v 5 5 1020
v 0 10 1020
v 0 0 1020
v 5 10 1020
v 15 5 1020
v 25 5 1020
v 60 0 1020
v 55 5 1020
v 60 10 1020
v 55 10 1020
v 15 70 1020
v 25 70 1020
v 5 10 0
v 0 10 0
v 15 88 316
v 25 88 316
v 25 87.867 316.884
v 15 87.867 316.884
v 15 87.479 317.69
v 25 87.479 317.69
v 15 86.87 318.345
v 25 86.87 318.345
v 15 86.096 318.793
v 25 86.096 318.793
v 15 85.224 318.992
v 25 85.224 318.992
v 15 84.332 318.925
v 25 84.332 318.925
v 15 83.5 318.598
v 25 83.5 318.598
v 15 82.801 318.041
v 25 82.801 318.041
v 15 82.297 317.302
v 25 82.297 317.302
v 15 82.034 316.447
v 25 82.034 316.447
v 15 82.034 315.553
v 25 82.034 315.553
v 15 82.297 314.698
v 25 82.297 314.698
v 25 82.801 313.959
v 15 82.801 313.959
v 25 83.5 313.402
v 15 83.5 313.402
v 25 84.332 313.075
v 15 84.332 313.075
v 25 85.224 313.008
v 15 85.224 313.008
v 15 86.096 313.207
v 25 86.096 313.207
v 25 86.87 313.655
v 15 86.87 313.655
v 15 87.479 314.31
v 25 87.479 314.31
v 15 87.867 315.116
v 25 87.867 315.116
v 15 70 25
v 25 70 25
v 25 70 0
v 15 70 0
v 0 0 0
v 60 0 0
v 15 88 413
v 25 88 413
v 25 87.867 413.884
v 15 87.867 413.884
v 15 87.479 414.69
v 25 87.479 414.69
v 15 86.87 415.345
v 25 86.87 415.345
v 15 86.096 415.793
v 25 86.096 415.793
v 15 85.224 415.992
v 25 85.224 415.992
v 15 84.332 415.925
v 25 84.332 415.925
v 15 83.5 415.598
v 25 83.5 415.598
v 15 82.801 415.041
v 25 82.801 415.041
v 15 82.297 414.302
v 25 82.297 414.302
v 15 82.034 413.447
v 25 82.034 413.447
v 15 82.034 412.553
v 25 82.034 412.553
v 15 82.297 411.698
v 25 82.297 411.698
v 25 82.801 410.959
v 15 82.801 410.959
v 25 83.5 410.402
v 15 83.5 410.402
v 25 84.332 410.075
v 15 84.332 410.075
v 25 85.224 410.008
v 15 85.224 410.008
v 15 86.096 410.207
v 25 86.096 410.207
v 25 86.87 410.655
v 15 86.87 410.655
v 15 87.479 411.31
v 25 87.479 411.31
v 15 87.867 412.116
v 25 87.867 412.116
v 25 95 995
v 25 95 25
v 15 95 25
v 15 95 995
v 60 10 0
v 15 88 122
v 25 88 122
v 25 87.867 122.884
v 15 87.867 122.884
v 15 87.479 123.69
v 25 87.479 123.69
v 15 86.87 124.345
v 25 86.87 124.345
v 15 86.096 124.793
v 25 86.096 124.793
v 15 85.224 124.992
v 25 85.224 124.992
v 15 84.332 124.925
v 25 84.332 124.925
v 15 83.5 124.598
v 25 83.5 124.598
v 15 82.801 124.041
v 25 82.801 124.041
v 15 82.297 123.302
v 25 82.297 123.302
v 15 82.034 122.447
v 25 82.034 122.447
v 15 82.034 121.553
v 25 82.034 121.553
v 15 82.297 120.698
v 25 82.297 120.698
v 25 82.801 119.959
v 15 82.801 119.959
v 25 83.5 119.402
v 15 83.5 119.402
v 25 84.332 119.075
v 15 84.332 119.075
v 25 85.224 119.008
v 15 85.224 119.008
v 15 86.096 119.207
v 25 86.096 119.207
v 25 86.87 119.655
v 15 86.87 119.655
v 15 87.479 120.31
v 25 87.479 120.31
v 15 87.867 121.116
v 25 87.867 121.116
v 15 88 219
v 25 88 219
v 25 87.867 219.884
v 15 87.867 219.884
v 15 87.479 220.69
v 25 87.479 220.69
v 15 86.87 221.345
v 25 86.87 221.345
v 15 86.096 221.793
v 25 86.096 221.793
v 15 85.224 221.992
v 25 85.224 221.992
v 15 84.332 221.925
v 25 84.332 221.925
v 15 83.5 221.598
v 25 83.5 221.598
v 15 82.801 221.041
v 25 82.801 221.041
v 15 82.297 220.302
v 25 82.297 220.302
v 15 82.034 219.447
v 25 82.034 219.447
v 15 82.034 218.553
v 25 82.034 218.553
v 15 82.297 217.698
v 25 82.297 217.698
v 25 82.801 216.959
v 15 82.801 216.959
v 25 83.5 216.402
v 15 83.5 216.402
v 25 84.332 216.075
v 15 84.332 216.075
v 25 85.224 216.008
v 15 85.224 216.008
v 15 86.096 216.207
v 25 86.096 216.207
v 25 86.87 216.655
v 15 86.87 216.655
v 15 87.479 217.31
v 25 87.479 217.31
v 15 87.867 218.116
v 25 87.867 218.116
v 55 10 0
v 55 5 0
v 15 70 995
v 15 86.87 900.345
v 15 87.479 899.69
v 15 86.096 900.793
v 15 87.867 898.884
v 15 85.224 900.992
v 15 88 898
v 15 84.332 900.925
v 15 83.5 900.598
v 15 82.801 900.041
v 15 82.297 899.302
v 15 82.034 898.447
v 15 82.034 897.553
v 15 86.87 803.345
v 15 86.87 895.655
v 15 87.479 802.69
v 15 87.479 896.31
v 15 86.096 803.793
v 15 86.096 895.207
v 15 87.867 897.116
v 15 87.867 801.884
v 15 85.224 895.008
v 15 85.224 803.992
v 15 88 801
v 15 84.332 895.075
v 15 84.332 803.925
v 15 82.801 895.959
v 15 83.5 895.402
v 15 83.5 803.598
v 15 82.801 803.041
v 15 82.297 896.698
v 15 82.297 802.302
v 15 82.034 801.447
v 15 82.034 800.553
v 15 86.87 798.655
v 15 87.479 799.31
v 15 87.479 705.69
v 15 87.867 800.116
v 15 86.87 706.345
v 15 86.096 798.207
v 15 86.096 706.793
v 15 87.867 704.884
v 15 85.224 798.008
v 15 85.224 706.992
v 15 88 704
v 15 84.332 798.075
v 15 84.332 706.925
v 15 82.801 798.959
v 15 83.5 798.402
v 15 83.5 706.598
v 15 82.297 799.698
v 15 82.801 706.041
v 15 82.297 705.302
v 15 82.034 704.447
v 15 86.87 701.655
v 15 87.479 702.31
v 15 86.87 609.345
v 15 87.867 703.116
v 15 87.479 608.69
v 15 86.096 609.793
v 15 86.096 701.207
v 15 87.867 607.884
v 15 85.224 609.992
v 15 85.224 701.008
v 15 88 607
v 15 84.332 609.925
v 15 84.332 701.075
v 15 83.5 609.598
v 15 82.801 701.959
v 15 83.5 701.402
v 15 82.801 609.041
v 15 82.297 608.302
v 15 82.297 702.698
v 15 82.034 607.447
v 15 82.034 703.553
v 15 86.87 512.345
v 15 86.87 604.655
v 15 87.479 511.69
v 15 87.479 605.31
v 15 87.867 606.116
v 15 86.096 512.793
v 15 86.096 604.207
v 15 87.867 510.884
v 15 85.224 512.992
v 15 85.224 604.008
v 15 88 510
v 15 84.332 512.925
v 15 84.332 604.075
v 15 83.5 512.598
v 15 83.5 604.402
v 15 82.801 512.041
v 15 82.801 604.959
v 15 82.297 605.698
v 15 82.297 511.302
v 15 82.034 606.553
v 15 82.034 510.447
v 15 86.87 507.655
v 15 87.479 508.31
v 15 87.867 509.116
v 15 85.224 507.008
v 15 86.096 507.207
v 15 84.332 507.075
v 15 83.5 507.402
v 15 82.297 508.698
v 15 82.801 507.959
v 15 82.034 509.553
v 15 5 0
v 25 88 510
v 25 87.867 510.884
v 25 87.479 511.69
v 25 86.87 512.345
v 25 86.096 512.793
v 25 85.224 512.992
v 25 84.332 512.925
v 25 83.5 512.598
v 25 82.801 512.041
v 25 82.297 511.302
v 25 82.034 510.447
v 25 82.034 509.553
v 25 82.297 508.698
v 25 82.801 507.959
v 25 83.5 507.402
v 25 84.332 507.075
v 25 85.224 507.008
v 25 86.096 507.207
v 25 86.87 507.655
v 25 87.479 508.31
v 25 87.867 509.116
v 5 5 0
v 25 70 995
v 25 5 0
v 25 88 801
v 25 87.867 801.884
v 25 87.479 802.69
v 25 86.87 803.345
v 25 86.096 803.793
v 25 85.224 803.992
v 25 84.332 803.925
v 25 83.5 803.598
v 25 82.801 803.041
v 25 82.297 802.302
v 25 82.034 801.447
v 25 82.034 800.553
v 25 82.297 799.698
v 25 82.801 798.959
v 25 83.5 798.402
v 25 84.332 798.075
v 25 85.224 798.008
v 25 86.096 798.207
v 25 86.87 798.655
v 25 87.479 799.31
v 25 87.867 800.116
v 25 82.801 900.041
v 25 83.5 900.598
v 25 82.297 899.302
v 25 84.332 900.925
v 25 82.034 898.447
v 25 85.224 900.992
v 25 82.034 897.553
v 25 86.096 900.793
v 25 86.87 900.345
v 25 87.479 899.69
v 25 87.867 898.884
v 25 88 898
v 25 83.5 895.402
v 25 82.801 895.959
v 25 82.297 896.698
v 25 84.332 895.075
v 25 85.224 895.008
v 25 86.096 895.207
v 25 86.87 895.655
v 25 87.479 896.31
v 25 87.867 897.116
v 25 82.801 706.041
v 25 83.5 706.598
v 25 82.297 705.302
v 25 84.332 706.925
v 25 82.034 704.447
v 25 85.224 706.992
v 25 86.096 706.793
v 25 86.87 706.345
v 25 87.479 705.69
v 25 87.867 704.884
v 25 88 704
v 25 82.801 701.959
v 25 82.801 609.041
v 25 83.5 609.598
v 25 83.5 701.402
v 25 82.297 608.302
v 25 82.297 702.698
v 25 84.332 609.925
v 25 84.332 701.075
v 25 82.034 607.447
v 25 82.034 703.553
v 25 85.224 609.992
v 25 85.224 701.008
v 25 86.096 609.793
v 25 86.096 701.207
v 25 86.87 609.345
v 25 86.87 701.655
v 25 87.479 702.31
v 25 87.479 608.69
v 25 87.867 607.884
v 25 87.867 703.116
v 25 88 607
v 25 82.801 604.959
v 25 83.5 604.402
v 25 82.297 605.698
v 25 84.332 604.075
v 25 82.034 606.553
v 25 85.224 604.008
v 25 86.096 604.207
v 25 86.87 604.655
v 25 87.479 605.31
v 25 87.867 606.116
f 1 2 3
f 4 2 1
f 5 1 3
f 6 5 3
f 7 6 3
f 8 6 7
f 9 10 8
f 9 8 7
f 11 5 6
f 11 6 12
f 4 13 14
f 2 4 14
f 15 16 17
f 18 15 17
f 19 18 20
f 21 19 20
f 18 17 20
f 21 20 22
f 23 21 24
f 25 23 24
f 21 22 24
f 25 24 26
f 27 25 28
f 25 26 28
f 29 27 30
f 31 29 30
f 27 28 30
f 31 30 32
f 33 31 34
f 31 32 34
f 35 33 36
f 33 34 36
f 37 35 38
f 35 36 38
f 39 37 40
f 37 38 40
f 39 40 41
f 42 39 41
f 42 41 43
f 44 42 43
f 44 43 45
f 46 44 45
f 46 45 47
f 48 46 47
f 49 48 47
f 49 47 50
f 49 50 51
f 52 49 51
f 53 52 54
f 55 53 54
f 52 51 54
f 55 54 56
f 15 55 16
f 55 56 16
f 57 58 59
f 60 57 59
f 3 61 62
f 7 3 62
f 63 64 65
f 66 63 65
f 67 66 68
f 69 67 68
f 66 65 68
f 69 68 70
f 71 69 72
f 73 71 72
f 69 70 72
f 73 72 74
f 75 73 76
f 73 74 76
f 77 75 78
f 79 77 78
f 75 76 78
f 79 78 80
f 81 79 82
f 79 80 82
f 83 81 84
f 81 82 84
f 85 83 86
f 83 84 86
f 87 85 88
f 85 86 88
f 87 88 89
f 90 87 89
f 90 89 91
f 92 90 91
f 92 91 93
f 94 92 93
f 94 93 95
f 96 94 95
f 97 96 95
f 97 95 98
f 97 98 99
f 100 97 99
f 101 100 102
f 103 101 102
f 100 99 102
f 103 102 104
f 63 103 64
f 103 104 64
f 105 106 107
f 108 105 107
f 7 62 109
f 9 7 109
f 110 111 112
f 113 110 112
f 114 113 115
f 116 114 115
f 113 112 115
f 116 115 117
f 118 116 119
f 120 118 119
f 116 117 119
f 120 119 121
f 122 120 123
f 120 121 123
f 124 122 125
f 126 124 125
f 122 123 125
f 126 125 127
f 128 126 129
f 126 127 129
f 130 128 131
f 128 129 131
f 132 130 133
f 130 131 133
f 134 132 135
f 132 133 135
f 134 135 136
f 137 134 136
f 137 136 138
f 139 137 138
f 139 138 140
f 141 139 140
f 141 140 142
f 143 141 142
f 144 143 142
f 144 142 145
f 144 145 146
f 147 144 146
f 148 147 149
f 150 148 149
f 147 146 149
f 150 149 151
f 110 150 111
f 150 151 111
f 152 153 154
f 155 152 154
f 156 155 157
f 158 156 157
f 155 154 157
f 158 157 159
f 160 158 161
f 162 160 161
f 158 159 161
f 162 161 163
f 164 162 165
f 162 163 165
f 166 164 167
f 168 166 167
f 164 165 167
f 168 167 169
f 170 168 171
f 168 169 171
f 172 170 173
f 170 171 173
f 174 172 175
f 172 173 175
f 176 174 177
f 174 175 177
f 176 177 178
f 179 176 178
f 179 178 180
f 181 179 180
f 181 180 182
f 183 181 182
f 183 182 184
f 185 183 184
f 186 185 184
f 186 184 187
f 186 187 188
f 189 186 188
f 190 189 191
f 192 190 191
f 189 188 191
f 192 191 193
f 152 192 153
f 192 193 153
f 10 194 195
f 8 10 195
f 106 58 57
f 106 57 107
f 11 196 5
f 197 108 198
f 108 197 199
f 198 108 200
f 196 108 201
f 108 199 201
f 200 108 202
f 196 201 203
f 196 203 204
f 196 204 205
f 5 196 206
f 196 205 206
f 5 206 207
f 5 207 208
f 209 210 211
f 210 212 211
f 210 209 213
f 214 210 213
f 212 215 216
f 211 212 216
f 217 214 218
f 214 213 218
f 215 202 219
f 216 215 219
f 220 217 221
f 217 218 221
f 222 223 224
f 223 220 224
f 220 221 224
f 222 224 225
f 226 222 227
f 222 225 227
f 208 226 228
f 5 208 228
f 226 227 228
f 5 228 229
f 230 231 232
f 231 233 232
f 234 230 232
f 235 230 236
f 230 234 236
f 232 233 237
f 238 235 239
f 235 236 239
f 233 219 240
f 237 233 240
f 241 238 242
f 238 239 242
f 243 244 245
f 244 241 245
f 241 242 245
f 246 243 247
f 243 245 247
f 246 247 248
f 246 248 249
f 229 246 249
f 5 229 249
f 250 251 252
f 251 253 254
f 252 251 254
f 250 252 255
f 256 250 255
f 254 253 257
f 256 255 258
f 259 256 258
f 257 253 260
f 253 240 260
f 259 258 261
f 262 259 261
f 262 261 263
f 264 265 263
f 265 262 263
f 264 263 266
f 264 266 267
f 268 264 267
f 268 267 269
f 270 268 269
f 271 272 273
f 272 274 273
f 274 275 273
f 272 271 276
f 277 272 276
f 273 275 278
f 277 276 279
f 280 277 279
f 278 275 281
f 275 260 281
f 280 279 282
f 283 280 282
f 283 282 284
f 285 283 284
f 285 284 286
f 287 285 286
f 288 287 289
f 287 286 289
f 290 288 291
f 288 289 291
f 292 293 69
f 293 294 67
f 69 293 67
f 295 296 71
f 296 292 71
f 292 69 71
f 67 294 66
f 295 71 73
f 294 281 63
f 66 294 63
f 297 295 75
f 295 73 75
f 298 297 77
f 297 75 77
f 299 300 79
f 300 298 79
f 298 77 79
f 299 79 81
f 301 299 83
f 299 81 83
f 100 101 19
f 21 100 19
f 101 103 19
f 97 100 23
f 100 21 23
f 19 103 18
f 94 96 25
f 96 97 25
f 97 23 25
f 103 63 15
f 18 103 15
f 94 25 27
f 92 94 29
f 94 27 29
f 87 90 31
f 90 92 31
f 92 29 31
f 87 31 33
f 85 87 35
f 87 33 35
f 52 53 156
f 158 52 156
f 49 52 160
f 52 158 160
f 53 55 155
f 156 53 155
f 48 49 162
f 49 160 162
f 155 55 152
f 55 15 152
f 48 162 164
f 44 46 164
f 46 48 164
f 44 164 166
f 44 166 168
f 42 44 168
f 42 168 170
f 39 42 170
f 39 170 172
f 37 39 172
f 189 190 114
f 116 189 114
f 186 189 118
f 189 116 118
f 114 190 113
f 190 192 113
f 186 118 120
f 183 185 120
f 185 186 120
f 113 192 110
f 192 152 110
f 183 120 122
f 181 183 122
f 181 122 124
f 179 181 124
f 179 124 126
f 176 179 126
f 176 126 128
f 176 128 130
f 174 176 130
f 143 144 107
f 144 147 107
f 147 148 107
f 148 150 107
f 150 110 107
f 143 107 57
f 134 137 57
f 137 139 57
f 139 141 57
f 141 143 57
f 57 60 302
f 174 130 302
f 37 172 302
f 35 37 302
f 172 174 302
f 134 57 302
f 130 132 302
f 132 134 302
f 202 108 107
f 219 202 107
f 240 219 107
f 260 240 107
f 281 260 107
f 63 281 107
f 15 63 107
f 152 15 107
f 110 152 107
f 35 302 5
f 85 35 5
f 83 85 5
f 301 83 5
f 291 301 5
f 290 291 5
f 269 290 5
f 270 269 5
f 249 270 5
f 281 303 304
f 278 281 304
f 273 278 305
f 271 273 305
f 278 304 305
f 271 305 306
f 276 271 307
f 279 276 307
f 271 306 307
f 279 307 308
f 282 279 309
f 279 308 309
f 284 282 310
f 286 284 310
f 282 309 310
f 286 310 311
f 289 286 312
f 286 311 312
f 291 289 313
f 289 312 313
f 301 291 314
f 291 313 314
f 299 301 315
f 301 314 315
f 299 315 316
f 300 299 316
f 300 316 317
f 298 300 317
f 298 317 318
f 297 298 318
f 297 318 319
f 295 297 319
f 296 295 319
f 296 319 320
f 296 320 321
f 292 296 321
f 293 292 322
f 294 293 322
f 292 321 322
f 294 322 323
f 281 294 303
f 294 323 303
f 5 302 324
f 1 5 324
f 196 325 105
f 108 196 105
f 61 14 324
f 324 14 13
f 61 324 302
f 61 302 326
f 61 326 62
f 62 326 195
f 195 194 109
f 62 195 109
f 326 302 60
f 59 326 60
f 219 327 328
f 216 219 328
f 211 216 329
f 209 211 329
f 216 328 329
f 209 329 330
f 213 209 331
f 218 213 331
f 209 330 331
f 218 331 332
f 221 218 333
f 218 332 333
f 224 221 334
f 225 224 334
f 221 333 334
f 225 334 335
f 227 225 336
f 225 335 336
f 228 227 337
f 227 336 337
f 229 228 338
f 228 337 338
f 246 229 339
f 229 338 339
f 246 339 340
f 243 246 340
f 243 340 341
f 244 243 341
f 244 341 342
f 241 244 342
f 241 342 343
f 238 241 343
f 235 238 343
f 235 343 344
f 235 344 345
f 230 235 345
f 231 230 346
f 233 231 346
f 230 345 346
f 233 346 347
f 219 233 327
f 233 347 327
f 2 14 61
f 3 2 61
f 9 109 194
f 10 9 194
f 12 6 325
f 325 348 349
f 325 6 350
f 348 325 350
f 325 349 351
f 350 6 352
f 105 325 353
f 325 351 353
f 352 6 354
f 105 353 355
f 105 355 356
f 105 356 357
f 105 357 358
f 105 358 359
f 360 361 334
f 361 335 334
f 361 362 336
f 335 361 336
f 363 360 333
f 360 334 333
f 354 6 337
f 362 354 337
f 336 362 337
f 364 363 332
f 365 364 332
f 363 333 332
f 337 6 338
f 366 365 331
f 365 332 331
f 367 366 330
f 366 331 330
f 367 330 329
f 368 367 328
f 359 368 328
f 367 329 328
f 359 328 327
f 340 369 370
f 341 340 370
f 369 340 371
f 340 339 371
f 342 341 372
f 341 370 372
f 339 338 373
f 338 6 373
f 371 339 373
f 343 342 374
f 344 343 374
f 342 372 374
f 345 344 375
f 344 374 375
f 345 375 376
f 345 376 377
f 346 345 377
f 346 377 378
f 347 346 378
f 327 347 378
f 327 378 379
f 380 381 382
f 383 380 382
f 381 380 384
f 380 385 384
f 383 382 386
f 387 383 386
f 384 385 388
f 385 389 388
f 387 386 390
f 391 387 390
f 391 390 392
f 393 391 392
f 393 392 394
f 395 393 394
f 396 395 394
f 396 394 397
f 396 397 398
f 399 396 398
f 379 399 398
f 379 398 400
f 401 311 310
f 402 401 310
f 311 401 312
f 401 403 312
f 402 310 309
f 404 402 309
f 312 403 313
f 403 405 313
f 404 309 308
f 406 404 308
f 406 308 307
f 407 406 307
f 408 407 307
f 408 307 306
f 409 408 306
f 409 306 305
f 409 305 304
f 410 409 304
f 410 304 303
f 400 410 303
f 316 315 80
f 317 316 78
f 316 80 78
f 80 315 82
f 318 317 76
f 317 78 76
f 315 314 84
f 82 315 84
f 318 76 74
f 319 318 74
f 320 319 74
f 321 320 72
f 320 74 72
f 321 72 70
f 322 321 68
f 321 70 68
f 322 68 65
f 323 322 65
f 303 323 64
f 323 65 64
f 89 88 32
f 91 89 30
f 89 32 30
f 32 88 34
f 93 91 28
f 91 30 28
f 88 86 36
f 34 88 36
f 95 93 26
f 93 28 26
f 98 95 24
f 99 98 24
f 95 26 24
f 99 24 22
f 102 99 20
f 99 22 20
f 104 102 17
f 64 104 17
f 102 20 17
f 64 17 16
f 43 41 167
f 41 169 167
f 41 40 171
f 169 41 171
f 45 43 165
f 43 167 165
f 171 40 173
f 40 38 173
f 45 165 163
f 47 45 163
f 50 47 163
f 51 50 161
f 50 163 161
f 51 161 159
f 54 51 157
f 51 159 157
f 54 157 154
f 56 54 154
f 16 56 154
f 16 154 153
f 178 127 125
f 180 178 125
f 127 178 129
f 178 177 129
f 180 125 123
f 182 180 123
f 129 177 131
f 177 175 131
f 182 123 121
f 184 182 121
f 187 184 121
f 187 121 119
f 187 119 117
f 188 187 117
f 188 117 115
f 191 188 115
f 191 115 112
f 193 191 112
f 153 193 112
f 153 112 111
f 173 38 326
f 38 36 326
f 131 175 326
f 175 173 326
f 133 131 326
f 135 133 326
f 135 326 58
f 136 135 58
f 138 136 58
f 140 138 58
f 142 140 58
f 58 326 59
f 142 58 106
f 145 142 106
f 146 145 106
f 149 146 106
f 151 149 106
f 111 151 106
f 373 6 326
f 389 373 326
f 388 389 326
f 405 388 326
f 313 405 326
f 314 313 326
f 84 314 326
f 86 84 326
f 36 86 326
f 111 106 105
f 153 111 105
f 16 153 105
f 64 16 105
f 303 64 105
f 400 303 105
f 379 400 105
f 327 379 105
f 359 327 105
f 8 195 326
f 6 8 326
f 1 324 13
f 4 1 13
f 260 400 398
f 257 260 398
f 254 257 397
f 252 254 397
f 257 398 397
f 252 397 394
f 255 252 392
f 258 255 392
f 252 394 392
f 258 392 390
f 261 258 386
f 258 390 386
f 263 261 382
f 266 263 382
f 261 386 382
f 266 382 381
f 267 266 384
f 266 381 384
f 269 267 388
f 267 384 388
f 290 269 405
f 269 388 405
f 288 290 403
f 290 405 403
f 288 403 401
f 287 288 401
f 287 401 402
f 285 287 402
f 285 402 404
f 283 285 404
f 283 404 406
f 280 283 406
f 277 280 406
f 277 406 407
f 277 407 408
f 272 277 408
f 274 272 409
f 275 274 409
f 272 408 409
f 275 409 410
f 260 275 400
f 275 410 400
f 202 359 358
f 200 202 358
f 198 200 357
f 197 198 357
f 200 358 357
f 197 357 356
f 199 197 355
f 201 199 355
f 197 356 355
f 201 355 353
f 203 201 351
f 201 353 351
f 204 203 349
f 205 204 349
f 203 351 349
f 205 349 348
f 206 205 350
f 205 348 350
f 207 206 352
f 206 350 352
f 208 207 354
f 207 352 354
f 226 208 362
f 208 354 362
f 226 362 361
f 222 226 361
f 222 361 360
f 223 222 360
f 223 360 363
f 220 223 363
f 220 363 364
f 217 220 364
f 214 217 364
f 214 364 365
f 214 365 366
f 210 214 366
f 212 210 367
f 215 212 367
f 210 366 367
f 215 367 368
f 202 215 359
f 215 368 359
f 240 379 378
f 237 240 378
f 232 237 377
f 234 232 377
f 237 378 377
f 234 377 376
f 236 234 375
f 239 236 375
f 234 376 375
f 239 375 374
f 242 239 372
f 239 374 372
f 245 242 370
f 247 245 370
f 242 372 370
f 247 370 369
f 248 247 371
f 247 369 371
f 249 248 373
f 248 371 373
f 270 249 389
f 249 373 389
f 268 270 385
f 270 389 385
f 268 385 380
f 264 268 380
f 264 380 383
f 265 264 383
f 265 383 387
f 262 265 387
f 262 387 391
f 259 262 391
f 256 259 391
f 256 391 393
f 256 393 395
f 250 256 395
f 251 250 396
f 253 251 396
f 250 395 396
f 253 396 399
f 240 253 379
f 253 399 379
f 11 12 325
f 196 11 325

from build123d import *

# Parameters (mm, degrees)
BOSS_EXTRUDE1_DEPTH = 1020
SKETCH2_W           = 25
SKETCH2_H           = 25
CUT_EXTRUDE1_DEPTH  = 10
SKETCH3_R           = 3
CUT_EXTRUDE2_DEPTH  = 10
LPATTERN1_COUNT     = 9
LPATTERN1_PITCH     = 97


with BuildPart() as part:
    # Sketch1 → Boss-Extrude1 (new body)
    with BuildSketch(Plane.XY):
        Polygon((0, 10), (0, 0), (60, 0), (60, 10), (55, 10), (55, 5), (25, 5), (25, 95), (15, 95), (15, 5), (5, 5), (5, 10), align=None)
    extrude(amount=BOSS_EXTRUDE1_DEPTH)

    # Sketch2 → Cut-Extrude1 (cut)
    with BuildSketch(Plane(origin=(25, 0, 0), x_dir=(0, 0, -1), z_dir=(1, 0, 0))):
        with Locations((-1007.5, 82.5)):
            Rectangle(SKETCH2_W, SKETCH2_H)
        with Locations((-12.5, 82.5)):
            Rectangle(SKETCH2_W, SKETCH2_H)
    extrude(amount=-CUT_EXTRUDE1_DEPTH, mode=Mode.SUBTRACT)

    # Sketch3 → Cut-Extrude2 (cut)
    with BuildSketch(Plane(origin=(25, 0, 0), x_dir=(0, 0, -1), z_dir=(1, 0, 0))):
        with Locations(Location((-898, 85, 0), (0, 0, 90))):
            Circle(SKETCH3_R)
    cut_extrude2 = extrude(amount=-CUT_EXTRUDE2_DEPTH, mode=Mode.SUBTRACT)

    # LPattern1: Cut-Extrude2 ×9
    with Locations(*[(0, 0, -i * LPATTERN1_PITCH) for i in range(1, LPATTERN1_COUNT)]):
        add(cut_extrude2, mode=Mode.SUBTRACT)


solid = part.part
